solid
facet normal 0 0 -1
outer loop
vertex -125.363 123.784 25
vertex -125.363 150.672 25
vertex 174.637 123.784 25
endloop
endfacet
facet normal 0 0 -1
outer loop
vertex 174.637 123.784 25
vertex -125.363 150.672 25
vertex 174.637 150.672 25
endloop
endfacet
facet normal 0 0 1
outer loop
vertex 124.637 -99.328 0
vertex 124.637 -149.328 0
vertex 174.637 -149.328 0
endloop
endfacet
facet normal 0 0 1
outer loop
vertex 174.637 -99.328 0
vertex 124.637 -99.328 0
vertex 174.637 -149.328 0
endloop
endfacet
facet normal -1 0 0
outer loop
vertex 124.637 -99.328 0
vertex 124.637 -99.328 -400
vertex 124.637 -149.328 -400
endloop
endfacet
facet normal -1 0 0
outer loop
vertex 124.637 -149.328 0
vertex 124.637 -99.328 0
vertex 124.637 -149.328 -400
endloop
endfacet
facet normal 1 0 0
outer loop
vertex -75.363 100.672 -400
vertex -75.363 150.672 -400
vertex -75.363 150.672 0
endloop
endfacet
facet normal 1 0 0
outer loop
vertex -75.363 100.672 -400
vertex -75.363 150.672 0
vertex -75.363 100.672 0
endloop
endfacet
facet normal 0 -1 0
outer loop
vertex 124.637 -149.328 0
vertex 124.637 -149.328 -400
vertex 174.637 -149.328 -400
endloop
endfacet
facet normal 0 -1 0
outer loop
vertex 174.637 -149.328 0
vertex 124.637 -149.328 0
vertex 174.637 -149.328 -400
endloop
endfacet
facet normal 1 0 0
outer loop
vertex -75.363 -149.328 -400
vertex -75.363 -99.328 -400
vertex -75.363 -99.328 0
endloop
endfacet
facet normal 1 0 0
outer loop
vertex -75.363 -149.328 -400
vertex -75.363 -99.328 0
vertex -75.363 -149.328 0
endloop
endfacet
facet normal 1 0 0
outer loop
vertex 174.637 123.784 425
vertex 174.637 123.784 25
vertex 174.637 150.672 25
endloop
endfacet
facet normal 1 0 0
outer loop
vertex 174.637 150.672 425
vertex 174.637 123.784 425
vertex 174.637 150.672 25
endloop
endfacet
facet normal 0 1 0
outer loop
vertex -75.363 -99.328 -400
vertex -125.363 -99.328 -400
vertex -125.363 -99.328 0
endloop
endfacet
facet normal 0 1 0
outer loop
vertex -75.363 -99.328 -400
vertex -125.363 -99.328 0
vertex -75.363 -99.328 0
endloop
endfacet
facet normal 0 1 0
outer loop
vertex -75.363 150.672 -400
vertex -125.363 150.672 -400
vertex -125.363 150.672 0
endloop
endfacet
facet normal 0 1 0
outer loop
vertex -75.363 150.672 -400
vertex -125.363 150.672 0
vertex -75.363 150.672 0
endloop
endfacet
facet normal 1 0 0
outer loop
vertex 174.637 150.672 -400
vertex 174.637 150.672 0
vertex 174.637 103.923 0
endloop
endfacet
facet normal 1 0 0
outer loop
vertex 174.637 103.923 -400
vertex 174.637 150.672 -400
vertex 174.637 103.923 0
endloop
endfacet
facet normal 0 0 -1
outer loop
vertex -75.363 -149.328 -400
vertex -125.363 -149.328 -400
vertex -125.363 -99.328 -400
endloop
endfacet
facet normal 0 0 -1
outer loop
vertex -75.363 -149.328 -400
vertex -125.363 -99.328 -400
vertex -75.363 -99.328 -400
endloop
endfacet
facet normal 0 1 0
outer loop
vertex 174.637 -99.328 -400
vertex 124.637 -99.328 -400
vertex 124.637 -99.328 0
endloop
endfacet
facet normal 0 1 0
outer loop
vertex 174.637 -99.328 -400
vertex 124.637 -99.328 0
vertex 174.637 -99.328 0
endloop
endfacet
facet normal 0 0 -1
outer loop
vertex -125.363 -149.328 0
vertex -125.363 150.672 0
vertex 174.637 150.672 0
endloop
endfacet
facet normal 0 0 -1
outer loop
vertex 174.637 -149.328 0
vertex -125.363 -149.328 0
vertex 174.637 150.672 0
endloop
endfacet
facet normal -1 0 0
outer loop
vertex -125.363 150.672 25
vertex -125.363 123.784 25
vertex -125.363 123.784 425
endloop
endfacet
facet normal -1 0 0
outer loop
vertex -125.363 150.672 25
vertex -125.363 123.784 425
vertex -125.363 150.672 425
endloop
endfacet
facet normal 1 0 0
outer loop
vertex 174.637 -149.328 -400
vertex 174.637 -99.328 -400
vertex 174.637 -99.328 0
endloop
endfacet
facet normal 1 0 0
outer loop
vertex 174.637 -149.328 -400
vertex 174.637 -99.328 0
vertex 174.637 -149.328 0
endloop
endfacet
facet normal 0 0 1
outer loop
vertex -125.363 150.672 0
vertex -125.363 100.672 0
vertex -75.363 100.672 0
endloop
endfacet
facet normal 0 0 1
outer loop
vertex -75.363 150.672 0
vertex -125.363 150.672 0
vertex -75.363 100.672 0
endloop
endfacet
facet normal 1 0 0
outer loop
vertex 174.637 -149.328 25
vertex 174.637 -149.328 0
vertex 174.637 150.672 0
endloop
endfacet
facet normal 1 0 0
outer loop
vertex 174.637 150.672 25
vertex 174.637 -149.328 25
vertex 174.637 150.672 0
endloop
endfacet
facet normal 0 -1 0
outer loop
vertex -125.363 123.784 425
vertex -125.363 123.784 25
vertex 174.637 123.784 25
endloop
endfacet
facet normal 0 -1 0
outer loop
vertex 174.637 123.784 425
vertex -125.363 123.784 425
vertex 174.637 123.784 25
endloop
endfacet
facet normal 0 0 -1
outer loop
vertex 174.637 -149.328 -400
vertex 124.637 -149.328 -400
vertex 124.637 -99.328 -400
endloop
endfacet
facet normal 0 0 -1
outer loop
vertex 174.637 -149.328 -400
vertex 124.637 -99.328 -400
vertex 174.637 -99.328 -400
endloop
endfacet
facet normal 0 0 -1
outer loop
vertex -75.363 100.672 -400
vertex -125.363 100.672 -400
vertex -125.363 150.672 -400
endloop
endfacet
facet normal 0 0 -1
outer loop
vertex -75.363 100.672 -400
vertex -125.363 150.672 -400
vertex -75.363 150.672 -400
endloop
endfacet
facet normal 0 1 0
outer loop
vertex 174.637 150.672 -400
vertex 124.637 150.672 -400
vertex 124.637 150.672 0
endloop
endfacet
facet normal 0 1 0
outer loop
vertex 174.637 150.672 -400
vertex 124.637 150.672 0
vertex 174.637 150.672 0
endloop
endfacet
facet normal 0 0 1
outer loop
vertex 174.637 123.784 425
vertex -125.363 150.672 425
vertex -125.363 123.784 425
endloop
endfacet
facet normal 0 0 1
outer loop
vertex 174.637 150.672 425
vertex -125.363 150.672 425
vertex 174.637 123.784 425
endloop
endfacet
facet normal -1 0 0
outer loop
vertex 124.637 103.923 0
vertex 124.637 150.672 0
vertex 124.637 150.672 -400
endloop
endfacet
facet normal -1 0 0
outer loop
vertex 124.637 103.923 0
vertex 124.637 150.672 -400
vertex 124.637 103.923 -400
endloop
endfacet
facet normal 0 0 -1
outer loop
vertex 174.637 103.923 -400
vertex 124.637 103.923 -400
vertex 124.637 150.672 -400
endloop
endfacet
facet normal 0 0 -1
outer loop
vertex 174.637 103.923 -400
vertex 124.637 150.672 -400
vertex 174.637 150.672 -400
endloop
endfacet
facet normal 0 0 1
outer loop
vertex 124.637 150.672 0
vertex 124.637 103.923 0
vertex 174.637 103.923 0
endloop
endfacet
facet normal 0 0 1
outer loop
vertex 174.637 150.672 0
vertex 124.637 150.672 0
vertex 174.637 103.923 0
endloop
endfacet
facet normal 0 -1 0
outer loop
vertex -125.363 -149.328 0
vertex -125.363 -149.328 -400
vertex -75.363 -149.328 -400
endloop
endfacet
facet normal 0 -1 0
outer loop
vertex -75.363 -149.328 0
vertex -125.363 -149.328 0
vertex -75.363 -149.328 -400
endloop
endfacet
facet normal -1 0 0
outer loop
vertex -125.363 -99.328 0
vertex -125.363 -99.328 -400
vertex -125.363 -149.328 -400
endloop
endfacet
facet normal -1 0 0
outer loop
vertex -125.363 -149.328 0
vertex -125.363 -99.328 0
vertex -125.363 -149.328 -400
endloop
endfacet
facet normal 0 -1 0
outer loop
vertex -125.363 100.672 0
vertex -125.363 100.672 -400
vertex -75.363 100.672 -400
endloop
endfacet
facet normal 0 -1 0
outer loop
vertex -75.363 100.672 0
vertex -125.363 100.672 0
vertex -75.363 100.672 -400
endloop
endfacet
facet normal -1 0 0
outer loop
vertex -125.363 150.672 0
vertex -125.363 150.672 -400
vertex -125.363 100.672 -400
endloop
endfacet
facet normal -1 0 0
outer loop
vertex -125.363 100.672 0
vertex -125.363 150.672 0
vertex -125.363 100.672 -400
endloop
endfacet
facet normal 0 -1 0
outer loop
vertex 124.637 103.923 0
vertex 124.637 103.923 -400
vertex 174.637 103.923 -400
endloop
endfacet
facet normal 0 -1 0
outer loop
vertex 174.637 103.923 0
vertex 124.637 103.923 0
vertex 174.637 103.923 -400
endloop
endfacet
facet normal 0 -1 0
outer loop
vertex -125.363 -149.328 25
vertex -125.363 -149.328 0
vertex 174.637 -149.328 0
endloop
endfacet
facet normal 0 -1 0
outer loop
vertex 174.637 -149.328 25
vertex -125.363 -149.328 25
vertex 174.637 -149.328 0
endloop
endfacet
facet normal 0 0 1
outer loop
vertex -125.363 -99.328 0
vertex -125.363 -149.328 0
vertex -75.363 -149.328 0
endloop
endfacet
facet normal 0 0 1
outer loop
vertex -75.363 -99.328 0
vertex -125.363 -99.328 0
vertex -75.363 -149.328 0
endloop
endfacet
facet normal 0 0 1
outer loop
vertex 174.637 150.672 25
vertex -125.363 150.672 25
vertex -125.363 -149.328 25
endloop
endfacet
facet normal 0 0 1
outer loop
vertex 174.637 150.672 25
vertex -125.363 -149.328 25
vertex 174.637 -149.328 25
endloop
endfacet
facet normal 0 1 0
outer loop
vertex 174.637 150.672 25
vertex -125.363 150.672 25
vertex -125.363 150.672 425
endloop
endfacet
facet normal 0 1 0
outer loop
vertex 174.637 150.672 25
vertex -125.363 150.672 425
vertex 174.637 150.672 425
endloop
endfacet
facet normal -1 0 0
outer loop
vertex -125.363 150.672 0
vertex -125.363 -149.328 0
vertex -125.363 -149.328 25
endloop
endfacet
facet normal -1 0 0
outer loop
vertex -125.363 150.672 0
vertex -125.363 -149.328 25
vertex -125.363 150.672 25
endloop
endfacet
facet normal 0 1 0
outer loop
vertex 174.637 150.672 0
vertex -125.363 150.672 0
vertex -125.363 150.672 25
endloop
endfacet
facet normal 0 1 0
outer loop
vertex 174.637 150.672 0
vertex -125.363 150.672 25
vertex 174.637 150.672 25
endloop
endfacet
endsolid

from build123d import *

# Parameters (mm, degrees)
F0_W     = 300
F0_H     = 300
F1_DEPTH = 25
F2_W     = 50
F2_H     = 50
F2_H_2   = 46.749371
F3_DEPTH = 400
F4_W     = 300
F4_H     = 26.887956
F5_DEPTH = 400


with BuildPart() as f1:
    # F0 (on Top) → F1 (new body)
    with BuildSketch(Plane.XY):
        with Locations((24.636572, 0.672424)):
            Rectangle(F0_W, F0_H)
    extrude(amount=F1_DEPTH)


with BuildPart() as f3:
    # F2 (on face) → F3 (new body)
    with BuildSketch(Plane(origin=(0, 0, 0), x_dir=(1, 0, 0), z_dir=(0, 0, -1))):
        with Locations((149.636572, 124.327576)):
            Rectangle(F2_W, F2_H)
        with Locations((-100.363428, 124.327576)):
            Rectangle(F2_W, F2_H)
        with Locations((-100.363428, -125.672424)):
            Rectangle(F2_W, F2_H)
        with Locations((149.636572, -127.297739)):
            Rectangle(F2_W, F2_H_2)
    extrude(amount=F3_DEPTH)


with BuildPart() as f5:
    # F4 (on face) → F5 (new body)
    with BuildSketch(Plane.XY.offset(25)):
        with Locations((24.636572, 137.228446)):
            Rectangle(F4_W, F4_H)
    extrude(amount=F5_DEPTH)


solid = Compound([f1.part, f3.part, f5.part])
